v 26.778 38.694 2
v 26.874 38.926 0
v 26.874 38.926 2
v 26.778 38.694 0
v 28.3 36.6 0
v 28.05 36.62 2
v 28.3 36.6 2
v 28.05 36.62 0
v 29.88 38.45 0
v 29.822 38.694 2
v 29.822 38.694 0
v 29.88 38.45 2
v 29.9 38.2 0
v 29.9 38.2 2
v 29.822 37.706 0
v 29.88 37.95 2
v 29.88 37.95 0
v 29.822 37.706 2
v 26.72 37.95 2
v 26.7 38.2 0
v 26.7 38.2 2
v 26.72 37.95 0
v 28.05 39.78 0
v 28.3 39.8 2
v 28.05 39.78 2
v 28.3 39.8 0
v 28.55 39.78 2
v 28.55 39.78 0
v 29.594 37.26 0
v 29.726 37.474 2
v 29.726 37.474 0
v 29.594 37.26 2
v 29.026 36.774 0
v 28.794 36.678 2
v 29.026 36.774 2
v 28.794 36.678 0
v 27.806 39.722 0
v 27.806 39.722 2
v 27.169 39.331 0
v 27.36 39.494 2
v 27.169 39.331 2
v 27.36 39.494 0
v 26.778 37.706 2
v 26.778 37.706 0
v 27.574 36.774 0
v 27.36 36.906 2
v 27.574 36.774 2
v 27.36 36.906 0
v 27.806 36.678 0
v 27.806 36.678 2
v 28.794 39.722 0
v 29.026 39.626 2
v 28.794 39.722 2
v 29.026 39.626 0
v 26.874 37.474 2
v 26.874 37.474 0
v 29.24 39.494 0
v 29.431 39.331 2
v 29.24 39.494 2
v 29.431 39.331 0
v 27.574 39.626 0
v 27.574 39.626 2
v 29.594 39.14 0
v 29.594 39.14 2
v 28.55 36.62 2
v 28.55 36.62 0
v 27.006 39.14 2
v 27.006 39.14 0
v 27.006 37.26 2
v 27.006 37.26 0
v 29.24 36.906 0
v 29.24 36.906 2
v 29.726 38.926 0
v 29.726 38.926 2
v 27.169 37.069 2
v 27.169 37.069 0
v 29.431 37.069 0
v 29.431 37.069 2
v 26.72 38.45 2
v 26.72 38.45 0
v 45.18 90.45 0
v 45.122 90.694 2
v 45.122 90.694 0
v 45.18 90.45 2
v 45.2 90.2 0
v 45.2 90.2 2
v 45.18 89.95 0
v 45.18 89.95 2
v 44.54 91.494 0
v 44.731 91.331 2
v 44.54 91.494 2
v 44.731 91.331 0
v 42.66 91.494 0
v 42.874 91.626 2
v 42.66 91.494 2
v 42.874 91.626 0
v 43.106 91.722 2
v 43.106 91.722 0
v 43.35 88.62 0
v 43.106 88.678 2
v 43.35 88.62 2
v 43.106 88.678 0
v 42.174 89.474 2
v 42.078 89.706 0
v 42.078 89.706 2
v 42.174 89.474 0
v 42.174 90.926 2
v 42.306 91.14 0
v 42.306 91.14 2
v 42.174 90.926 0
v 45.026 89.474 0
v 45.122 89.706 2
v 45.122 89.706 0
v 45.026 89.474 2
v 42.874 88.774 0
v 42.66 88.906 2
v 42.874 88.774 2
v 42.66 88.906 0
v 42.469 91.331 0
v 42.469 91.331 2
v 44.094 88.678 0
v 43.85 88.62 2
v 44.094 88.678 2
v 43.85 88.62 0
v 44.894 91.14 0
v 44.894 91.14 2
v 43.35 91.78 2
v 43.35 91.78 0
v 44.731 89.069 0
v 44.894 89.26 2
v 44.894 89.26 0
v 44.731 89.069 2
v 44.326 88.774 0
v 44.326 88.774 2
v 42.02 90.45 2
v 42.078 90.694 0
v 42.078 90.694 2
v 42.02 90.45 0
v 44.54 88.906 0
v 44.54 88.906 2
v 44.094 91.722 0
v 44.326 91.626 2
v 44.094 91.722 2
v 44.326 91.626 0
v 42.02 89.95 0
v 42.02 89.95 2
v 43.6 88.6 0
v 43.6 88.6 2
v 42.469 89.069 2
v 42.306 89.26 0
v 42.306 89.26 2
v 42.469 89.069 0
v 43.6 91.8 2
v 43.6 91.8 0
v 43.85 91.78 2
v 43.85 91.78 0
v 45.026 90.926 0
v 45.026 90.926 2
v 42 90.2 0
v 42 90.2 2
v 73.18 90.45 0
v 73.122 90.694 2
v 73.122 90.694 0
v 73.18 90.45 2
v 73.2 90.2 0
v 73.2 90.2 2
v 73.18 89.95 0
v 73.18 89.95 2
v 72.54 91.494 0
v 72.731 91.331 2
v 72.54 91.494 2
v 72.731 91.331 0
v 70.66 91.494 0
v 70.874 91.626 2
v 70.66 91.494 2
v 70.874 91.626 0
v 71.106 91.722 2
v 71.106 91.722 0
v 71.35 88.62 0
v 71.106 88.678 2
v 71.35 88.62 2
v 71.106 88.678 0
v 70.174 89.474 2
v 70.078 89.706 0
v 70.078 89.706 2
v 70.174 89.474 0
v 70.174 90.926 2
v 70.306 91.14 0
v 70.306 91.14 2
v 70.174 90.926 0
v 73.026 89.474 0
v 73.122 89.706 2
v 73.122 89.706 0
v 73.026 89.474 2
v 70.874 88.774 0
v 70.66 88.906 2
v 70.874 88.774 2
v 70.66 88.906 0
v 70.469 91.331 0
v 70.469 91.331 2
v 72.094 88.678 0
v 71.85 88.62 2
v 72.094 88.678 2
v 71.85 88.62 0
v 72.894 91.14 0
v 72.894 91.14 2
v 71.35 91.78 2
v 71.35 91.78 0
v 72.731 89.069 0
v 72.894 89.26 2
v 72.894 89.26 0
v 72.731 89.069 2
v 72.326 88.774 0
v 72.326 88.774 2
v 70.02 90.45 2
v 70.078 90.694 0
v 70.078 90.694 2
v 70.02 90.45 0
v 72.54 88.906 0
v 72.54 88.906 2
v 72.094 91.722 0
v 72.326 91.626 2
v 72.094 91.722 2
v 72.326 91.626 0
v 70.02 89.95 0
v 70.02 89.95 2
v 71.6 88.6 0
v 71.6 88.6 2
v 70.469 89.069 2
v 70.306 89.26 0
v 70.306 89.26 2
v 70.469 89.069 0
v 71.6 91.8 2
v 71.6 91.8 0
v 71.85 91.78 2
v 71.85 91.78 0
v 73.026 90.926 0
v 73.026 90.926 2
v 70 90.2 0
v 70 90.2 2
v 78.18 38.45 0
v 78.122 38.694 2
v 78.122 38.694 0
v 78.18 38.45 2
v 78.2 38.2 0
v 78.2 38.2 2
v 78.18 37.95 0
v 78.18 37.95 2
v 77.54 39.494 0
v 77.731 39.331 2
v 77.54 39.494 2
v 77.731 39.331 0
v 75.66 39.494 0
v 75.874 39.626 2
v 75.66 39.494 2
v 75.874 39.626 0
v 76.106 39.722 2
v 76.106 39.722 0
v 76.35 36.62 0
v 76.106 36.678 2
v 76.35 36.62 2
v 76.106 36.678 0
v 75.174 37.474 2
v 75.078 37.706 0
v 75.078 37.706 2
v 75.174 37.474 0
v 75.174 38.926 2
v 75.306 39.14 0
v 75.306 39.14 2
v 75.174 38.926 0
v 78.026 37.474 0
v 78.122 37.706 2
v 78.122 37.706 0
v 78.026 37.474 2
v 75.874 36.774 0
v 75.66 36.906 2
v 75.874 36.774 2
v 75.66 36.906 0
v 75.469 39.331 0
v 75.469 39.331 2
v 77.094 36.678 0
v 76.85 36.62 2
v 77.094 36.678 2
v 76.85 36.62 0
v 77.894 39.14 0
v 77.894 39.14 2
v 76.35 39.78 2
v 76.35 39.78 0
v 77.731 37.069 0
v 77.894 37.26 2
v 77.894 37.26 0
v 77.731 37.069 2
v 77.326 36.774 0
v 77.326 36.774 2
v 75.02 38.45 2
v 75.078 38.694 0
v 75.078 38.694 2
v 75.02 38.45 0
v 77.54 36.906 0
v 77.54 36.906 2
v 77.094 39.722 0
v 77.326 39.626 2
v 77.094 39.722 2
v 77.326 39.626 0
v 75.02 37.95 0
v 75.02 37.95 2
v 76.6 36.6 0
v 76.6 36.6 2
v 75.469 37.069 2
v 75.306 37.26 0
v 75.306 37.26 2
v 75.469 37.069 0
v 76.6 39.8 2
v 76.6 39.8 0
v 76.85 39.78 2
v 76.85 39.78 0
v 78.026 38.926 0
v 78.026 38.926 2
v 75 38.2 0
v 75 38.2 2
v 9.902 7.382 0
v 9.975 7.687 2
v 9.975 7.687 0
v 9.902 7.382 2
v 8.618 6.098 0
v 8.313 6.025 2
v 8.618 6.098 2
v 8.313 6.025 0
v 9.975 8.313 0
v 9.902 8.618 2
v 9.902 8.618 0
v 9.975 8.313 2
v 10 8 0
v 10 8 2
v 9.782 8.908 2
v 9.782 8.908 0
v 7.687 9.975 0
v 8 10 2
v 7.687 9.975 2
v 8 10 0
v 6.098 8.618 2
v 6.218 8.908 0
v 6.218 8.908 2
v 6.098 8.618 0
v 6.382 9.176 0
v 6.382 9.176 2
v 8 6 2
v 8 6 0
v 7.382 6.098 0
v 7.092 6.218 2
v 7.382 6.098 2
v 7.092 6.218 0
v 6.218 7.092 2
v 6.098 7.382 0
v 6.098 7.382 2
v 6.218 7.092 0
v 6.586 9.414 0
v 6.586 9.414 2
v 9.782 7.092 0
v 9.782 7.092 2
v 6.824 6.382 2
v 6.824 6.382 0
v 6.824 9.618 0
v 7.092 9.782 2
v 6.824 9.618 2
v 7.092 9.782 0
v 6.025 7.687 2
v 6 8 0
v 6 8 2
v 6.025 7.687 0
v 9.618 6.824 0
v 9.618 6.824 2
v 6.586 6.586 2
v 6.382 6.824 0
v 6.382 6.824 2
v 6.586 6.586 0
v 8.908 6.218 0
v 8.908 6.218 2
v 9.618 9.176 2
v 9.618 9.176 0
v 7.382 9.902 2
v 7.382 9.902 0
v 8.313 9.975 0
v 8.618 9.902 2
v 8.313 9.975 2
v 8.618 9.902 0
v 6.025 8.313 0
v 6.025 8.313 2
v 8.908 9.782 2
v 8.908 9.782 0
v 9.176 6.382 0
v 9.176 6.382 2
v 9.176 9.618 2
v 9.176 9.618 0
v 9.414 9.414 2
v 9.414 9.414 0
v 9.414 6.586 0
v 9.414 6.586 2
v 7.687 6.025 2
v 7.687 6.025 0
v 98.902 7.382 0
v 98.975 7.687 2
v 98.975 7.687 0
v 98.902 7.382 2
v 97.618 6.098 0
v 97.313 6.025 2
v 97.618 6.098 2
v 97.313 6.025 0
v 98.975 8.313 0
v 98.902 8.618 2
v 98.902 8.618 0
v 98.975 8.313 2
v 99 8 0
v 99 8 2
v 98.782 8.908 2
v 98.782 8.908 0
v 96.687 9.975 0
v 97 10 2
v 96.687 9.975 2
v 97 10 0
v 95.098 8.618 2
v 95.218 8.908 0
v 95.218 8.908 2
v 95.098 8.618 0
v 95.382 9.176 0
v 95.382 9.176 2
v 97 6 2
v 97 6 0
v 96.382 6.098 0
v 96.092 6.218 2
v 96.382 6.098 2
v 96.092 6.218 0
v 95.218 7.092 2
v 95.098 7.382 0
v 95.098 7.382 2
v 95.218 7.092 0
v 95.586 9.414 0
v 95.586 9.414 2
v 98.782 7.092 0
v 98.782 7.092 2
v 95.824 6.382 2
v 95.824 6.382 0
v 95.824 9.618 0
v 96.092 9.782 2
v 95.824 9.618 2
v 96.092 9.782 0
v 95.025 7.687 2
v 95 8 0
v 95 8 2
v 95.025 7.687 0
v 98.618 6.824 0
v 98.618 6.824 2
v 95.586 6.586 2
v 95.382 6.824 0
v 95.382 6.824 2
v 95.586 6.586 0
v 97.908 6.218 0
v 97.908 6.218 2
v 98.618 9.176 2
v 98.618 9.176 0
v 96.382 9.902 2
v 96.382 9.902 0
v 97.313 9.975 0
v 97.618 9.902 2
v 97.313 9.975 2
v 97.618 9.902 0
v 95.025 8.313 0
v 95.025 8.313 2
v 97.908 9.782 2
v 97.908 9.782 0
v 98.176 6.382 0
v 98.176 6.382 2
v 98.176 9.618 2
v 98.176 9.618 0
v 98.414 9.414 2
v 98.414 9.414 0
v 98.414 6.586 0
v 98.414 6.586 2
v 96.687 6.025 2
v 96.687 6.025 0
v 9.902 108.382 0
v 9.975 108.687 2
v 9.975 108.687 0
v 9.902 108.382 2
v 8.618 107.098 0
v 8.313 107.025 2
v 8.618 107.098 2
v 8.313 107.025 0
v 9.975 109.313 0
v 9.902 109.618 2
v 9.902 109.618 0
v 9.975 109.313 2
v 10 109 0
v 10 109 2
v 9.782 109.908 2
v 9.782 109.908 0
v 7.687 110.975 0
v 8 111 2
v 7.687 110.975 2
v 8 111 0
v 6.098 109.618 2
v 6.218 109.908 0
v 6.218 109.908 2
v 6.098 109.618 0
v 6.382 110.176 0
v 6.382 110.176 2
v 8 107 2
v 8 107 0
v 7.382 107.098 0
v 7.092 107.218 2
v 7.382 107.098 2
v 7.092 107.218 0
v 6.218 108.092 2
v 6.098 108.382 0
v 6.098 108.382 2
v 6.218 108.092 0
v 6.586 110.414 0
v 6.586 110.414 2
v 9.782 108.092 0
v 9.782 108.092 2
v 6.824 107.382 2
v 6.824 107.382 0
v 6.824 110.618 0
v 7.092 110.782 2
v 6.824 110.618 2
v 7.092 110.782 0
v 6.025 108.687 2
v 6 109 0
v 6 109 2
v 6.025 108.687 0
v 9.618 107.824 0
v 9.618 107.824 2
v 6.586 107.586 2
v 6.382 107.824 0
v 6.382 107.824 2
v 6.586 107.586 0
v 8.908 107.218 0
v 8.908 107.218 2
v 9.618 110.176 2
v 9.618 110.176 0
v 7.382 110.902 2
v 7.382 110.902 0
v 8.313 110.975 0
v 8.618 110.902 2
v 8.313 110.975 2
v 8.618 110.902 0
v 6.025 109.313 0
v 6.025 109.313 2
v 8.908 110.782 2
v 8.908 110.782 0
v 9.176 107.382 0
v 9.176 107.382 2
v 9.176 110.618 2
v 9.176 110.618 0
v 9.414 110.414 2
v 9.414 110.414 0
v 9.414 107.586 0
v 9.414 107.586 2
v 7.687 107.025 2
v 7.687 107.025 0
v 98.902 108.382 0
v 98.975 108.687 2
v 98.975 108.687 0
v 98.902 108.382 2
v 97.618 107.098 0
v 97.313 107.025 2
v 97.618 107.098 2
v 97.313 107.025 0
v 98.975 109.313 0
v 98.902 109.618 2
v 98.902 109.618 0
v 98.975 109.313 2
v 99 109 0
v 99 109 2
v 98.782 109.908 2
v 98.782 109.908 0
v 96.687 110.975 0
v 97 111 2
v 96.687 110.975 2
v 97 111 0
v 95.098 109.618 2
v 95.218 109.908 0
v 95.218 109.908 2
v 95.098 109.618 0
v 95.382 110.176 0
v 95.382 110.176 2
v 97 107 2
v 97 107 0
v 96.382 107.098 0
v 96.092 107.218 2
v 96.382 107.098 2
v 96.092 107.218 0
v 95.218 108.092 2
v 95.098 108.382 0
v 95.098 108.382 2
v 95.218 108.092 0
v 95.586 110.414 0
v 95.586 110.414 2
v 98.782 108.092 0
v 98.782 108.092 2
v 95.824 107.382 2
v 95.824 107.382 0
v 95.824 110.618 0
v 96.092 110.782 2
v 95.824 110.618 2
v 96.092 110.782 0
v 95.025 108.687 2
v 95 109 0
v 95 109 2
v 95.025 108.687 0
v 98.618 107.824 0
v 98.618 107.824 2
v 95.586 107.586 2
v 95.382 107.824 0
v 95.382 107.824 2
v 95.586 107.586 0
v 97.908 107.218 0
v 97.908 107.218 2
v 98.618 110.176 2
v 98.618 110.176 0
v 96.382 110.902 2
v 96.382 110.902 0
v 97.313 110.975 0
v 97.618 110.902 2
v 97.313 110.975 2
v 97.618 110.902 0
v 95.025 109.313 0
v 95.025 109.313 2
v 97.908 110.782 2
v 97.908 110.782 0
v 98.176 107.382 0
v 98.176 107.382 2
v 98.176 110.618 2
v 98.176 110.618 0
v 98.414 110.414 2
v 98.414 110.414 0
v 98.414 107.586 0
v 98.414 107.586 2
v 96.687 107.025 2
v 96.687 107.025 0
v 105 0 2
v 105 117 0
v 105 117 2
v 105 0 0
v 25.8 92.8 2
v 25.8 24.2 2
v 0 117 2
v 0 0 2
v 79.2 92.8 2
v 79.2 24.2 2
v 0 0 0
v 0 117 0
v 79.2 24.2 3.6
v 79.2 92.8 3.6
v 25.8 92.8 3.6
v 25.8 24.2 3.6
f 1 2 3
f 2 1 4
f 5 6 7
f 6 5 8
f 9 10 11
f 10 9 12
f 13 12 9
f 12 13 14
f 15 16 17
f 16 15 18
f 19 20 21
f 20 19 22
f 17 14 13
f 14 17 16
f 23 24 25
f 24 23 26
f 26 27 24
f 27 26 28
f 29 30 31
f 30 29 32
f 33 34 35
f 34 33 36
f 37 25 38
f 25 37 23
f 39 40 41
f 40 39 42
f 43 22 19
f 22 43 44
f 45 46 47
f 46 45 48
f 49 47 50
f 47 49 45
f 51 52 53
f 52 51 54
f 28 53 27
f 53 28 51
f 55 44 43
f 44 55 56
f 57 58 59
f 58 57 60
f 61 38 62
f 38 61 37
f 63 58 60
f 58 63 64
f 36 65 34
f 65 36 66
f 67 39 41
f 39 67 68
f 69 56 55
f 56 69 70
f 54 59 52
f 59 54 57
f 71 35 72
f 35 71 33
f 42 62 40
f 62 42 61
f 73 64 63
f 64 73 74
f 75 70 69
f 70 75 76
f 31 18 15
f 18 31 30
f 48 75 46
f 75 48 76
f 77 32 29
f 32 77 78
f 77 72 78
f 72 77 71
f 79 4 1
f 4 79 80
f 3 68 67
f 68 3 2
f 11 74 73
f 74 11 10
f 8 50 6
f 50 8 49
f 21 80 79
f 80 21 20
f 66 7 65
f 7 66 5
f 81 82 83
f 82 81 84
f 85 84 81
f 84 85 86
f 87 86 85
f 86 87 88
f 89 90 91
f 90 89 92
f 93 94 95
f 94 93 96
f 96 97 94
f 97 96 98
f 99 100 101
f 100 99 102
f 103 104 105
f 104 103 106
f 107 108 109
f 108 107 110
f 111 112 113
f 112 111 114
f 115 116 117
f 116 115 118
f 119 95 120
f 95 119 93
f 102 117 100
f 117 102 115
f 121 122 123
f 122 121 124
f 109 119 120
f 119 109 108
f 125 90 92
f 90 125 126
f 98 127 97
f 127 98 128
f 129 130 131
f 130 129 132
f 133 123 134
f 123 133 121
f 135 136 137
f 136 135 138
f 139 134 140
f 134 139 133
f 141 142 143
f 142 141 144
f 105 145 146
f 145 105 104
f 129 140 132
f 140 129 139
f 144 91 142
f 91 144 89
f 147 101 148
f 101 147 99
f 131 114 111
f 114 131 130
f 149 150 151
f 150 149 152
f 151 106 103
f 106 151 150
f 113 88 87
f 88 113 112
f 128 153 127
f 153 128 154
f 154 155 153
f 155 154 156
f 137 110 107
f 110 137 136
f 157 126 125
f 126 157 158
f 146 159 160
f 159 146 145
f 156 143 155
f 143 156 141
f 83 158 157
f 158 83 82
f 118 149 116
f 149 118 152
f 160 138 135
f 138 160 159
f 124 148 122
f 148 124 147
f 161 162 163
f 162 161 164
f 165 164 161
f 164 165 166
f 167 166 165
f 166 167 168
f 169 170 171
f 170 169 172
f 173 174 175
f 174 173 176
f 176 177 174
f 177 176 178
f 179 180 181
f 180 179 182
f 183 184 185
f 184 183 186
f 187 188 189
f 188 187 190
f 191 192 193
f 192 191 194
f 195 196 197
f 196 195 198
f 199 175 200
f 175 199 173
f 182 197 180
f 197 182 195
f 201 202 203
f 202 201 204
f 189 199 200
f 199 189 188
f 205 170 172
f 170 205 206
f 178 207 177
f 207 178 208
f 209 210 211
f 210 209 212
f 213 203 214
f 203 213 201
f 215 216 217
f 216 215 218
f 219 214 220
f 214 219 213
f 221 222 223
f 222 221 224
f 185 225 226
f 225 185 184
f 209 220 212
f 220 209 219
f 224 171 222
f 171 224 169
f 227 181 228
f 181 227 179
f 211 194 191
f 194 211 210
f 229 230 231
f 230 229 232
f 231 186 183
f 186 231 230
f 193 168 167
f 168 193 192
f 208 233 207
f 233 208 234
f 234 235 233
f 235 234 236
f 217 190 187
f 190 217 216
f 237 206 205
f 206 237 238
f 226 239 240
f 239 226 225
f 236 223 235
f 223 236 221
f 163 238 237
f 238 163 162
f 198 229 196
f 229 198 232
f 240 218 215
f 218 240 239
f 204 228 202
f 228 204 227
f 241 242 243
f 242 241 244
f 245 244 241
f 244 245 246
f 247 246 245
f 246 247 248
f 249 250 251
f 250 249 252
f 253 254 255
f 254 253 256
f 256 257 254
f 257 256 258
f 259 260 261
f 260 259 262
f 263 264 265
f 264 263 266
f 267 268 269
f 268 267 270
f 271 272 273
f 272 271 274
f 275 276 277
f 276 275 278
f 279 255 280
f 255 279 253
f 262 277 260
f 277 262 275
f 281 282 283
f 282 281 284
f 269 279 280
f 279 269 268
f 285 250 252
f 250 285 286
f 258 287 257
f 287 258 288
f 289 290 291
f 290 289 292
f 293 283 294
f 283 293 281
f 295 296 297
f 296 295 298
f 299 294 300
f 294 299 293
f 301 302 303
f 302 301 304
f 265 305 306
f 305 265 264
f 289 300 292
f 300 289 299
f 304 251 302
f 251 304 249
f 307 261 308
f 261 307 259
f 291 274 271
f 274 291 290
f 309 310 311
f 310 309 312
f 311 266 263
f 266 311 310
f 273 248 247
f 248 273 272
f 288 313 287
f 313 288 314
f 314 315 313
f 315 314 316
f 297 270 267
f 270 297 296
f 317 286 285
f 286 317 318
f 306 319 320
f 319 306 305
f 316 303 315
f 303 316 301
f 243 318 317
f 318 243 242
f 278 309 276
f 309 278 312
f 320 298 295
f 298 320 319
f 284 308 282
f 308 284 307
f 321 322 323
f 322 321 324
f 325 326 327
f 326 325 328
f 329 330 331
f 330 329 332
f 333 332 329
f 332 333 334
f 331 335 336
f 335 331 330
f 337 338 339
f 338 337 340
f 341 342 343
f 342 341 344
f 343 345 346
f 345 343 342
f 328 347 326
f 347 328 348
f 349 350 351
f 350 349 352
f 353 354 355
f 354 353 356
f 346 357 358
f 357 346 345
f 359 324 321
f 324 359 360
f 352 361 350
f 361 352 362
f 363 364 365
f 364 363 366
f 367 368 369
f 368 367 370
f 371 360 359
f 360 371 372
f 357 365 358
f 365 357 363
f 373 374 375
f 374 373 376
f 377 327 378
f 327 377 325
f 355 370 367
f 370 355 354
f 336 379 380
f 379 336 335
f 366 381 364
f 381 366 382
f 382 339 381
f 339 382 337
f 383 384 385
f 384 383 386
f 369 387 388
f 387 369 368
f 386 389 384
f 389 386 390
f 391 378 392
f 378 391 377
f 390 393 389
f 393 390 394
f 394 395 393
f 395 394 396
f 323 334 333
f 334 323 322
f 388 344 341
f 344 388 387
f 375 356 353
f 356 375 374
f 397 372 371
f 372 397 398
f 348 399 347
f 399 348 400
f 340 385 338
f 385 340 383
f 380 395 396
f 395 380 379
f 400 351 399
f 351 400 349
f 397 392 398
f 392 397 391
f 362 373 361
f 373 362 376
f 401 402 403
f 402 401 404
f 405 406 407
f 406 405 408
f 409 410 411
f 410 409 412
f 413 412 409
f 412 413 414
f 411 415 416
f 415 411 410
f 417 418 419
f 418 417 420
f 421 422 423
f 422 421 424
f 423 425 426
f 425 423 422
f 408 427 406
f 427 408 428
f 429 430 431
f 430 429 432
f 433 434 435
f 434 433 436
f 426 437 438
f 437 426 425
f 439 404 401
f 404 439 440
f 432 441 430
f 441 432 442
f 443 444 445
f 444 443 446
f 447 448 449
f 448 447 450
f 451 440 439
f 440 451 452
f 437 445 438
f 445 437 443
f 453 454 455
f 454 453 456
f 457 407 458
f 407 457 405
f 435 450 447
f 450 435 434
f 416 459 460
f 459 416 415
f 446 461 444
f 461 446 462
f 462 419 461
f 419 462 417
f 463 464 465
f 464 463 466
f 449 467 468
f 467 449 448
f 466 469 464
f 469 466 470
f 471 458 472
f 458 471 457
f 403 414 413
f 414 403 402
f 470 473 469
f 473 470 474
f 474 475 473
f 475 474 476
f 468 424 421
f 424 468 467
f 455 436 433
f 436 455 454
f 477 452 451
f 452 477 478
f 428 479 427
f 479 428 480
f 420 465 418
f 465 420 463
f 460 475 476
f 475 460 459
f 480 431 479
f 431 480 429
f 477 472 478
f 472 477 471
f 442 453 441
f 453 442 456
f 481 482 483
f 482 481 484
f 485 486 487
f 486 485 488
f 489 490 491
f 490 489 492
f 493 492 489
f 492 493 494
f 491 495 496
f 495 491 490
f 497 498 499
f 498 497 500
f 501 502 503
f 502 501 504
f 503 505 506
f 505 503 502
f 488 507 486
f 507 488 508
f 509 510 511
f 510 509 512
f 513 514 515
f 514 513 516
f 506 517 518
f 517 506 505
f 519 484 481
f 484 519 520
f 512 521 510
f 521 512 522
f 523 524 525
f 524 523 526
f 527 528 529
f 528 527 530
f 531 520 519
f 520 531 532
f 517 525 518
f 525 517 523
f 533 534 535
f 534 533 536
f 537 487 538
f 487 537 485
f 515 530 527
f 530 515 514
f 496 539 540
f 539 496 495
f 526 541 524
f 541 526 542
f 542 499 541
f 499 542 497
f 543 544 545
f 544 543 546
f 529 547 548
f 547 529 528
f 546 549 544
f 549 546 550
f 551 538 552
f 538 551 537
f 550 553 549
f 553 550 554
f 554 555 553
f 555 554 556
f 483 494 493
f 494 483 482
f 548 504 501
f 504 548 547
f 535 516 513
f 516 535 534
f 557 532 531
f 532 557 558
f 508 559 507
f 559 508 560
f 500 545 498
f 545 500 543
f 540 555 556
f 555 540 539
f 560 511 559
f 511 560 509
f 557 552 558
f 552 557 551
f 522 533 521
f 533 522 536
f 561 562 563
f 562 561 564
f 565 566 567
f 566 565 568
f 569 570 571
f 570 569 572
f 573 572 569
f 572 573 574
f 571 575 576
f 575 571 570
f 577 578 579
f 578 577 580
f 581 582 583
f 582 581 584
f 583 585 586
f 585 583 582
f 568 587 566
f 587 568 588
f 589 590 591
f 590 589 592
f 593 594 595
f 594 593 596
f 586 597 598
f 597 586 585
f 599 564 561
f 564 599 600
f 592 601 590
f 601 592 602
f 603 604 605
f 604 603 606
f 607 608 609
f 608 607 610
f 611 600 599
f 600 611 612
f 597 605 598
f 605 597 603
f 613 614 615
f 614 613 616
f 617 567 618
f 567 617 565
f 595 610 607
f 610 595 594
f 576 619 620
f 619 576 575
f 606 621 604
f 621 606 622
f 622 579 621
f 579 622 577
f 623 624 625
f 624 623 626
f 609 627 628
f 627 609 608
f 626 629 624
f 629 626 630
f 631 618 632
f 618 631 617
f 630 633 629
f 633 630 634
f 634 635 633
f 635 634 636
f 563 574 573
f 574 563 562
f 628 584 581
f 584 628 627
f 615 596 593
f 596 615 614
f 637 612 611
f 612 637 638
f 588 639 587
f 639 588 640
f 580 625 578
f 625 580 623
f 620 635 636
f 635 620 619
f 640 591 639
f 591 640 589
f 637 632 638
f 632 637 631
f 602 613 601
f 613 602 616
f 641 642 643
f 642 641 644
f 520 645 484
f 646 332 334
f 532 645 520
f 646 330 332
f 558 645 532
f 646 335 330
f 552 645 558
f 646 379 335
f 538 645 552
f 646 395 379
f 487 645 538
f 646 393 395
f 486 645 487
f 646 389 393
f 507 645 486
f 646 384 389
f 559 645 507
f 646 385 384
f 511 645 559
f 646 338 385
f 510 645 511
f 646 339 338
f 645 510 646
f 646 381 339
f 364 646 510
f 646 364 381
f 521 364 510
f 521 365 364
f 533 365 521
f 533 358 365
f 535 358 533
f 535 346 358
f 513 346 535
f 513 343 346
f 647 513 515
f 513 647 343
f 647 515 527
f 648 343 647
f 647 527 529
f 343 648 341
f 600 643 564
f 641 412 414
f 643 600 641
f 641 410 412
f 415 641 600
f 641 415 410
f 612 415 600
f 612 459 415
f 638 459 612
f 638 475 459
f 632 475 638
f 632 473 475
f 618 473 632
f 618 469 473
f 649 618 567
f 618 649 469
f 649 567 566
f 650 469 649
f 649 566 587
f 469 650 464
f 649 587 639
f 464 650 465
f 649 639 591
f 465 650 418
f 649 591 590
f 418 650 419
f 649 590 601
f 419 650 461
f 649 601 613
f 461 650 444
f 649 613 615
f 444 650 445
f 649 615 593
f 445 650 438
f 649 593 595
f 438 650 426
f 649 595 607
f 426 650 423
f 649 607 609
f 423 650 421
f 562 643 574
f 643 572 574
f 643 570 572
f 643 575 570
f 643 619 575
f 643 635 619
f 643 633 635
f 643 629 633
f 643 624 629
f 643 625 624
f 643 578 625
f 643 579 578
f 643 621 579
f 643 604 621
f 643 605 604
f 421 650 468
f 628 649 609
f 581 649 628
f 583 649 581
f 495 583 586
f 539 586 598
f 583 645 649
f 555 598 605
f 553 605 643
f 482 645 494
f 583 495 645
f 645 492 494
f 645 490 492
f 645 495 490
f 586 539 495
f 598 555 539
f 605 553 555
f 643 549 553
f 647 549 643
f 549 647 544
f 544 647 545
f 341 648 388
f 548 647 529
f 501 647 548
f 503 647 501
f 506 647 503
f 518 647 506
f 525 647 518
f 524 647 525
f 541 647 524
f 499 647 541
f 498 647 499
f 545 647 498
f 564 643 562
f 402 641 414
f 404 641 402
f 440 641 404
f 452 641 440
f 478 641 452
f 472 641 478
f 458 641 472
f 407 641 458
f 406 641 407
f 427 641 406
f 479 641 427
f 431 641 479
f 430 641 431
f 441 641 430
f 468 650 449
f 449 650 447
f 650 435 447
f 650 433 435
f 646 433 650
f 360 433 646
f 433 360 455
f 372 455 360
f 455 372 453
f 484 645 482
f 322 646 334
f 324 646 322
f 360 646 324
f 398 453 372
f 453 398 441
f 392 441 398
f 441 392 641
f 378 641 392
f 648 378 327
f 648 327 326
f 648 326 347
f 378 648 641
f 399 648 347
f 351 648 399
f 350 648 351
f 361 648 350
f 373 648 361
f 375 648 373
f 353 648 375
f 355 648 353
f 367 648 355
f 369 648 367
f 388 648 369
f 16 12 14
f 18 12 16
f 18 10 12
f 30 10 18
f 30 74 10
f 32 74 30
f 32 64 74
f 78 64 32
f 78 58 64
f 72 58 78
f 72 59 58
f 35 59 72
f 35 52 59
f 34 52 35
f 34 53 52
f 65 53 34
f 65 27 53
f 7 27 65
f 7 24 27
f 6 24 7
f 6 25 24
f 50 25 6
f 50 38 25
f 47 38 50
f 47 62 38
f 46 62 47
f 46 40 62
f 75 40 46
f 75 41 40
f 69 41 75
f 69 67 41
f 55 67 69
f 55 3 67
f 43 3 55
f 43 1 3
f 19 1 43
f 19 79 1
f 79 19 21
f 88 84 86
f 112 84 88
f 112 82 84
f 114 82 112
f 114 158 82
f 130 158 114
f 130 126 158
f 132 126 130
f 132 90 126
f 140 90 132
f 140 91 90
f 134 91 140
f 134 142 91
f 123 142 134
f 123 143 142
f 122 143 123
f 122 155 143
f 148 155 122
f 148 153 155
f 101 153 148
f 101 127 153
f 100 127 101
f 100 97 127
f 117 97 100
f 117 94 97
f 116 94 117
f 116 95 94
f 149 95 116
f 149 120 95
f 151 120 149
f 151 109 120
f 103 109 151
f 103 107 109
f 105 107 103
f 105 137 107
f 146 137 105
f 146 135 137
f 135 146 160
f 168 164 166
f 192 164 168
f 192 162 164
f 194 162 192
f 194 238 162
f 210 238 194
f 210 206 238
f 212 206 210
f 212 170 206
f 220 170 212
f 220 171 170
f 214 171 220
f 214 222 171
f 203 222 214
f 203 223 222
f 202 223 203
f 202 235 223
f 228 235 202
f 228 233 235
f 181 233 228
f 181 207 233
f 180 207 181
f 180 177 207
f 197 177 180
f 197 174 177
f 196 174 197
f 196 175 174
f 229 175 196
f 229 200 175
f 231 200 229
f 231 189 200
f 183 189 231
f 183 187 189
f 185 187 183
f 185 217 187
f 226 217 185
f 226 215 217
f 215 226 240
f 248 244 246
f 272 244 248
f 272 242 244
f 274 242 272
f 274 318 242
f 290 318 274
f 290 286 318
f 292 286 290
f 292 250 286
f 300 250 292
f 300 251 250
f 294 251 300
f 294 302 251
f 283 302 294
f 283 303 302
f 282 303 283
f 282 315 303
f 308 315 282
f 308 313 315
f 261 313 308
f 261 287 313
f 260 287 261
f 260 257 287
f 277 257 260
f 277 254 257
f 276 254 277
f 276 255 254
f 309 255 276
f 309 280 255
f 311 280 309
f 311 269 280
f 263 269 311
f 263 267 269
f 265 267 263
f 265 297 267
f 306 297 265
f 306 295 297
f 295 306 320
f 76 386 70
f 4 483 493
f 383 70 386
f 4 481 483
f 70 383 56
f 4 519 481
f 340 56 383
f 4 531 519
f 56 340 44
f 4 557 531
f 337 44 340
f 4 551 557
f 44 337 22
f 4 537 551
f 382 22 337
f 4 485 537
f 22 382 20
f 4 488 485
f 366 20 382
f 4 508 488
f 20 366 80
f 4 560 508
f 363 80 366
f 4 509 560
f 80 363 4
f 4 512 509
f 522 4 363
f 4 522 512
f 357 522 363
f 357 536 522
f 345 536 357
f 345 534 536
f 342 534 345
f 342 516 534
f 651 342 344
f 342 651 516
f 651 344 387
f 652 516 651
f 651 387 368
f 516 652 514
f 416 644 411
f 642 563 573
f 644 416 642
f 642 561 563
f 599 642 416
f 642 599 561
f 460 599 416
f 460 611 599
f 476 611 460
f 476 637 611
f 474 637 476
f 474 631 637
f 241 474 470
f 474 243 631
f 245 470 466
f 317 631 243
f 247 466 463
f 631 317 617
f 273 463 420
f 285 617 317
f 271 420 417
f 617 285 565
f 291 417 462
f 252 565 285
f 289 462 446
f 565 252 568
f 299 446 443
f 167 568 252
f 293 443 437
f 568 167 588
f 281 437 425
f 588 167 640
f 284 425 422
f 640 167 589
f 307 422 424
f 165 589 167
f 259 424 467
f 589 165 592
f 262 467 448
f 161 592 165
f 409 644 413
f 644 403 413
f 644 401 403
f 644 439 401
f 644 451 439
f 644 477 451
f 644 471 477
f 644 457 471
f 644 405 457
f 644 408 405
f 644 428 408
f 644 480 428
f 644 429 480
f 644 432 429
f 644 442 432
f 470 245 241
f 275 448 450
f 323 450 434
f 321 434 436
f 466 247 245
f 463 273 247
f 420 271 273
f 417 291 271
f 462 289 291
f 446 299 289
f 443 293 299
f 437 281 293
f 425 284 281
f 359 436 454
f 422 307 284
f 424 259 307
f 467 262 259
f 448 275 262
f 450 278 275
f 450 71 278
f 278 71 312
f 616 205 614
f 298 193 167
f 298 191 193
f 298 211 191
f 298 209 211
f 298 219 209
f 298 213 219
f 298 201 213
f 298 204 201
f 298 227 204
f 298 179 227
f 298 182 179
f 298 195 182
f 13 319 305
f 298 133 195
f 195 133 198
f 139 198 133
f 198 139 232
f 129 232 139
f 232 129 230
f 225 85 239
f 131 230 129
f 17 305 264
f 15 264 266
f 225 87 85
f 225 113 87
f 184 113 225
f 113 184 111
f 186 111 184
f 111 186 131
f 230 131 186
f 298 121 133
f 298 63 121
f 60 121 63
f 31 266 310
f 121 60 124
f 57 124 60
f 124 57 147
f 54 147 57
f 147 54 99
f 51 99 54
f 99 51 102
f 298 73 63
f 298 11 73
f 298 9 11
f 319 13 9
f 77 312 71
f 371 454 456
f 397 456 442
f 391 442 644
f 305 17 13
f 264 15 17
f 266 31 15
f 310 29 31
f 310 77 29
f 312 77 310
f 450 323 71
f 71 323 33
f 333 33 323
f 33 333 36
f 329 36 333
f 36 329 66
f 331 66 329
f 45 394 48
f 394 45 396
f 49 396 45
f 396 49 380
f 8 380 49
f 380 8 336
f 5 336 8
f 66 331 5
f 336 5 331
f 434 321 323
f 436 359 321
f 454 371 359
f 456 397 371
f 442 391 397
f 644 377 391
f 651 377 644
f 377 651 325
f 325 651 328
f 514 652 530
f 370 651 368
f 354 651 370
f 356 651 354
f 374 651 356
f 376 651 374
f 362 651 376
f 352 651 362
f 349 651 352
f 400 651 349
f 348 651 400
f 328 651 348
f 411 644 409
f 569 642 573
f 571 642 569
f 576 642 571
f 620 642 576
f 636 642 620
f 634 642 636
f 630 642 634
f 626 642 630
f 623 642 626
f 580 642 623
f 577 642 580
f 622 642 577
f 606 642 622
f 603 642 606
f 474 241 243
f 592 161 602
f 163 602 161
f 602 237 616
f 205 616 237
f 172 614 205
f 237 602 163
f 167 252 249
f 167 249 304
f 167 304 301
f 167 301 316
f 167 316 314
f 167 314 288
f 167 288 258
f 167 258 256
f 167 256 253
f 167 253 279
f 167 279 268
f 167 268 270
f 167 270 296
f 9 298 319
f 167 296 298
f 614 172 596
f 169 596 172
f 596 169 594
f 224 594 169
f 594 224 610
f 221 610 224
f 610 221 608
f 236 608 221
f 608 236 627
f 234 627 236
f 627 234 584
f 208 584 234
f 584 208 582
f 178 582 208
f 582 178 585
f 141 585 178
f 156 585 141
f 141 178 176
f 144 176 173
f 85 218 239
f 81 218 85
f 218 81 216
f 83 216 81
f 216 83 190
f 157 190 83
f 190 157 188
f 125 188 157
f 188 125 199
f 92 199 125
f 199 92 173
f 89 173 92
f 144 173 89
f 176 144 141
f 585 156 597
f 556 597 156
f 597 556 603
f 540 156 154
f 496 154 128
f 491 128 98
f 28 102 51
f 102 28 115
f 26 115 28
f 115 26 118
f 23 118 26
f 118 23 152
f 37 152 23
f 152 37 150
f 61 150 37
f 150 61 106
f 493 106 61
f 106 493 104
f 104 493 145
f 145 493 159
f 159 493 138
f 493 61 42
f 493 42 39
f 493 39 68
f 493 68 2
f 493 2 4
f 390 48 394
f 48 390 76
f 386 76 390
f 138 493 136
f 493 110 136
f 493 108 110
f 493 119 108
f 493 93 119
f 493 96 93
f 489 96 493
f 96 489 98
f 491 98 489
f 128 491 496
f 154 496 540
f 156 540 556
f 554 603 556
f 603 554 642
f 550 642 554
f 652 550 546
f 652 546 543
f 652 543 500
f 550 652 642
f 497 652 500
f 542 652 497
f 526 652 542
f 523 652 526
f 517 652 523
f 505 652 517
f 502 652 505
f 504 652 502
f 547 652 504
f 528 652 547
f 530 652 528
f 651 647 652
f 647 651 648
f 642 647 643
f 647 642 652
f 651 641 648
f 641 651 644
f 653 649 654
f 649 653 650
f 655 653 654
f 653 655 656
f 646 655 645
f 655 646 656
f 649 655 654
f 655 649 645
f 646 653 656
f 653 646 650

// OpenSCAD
/*
Takachi WGV Carrier Plate Generator
Arduino UNO + Portenta Support
--------------------------------

Supported presets:
- WGP15-16
- WGP15-21
- WGP17-25
- WGP23-25

Supported board types:
- Arduino UNO
- Arduino Portenta H7 / X8

Features:
- Parametric enclosure sizes
- Parametric board selection
- Board mounting holes
- Optional corner holes
- Optional preview geometry

Units: mm
*/

// ======================================================
// USER SETTINGS
// ======================================================

// ENCLOSURE PRESET
// 0 = WGP15-16
// 1 = WGP15-21
// 2 = WGP17-25
// 3 = WGP23-25

preset_index = 0;

// BOARD TYPE
// 0 = Arduino UNO
// 1 = Arduino Portenta

board_type = 0;

// Plate thickness
plate_thickness = 2.0;

// Hole diameters
board_hole_diameter = 3.2;
corner_hole_diameter = 4.0;

// Corner mounting hole settings
show_corner_holes = true;
corner_offset = 8;

// Show board visualization
show_board_preview = true;

// ======================================================
// PRESET DATA
// ======================================================

plate_sizes = [
    [105,117],   // WGP15-16
    [105,167],   // WGP15-21
    [125,207],   // WGP17-25
    [185,207]    // WGP23-25
];

preset_names = [
    "WGP15-16",
    "WGP15-21",
    "WGP17-25",
    "WGP23-25"
];

// ======================================================
// BOARD DEFINITIONS
// ======================================================

// ---------- Arduino UNO ----------

uno_width  = 53.4;
uno_height = 68.6;

uno_holes = [
    [2.5, 14],
    [17.8, 66],
    [45.8, 66],
    [50.8, 14]
];

// ---------- Arduino Portenta ----------

// Approximate dimensions for Portenta H7/X8
portenta_width  = 66.0;
portenta_height = 25.0;

// Simplified 4-hole pattern
portenta_holes = [
    [3, 3],
    [63, 3],
    [3, 22],
    [63, 22]
];

// ======================================================
// BOARD SELECTOR
// ======================================================

board_width =
    (board_type == 0) ? uno_width :
    portenta_width;

board_height =
    (board_type == 0) ? uno_height :
    portenta_height;

board_holes =
    (board_type == 0) ? uno_holes :
    portenta_holes;

board_name =
    (board_type == 0) ? "Arduino UNO" :
    "Arduino Portenta";

// ======================================================
// MAIN GEOMETRY
// ======================================================

plate_x = plate_sizes[preset_index][0];
plate_y = plate_sizes[preset_index][1];

echo("Preset:", preset_names[preset_index]);
echo("Board:", board_name);

difference() {

    // Main carrier plate
    cube([plate_x, plate_y, plate_thickness]);

    // Board mounting holes
    translate([
        (plate_x - board_width)/2,
        (plate_y - board_height)/2,
        -1
    ])
    for (p = board_holes)
    {
        translate([p[0], p[1], 0])
            cylinder(
                h = plate_thickness + 2,
                d = board_hole_diameter,
                $fn = 40
            );
    }

    // Corner enclosure mounting holes
    if (show_corner_holes)
    {
        corner_positions = [
            [corner_offset, corner_offset],
            [plate_x - corner_offset, corner_offset],
            [corner_offset, plate_y - corner_offset],
            [plate_x - corner_offset, plate_y - corner_offset]
        ];

        for (c = corner_positions)
        {
            translate([c[0], c[1], -1])
                cylinder(
                    h = plate_thickness + 2,
                    d = corner_hole_diameter,
                    $fn = 40
                );
        }
    }
}

// ======================================================
// OPTIONAL BOARD PREVIEW
// ======================================================

if (show_board_preview)
{
    color([0,0.5,0])
    translate([
        (plate_x - board_width)/2,
        (plate_y - board_height)/2,
        plate_thickness
    ])
    cube([board_width, board_height, 1.6]);
}
